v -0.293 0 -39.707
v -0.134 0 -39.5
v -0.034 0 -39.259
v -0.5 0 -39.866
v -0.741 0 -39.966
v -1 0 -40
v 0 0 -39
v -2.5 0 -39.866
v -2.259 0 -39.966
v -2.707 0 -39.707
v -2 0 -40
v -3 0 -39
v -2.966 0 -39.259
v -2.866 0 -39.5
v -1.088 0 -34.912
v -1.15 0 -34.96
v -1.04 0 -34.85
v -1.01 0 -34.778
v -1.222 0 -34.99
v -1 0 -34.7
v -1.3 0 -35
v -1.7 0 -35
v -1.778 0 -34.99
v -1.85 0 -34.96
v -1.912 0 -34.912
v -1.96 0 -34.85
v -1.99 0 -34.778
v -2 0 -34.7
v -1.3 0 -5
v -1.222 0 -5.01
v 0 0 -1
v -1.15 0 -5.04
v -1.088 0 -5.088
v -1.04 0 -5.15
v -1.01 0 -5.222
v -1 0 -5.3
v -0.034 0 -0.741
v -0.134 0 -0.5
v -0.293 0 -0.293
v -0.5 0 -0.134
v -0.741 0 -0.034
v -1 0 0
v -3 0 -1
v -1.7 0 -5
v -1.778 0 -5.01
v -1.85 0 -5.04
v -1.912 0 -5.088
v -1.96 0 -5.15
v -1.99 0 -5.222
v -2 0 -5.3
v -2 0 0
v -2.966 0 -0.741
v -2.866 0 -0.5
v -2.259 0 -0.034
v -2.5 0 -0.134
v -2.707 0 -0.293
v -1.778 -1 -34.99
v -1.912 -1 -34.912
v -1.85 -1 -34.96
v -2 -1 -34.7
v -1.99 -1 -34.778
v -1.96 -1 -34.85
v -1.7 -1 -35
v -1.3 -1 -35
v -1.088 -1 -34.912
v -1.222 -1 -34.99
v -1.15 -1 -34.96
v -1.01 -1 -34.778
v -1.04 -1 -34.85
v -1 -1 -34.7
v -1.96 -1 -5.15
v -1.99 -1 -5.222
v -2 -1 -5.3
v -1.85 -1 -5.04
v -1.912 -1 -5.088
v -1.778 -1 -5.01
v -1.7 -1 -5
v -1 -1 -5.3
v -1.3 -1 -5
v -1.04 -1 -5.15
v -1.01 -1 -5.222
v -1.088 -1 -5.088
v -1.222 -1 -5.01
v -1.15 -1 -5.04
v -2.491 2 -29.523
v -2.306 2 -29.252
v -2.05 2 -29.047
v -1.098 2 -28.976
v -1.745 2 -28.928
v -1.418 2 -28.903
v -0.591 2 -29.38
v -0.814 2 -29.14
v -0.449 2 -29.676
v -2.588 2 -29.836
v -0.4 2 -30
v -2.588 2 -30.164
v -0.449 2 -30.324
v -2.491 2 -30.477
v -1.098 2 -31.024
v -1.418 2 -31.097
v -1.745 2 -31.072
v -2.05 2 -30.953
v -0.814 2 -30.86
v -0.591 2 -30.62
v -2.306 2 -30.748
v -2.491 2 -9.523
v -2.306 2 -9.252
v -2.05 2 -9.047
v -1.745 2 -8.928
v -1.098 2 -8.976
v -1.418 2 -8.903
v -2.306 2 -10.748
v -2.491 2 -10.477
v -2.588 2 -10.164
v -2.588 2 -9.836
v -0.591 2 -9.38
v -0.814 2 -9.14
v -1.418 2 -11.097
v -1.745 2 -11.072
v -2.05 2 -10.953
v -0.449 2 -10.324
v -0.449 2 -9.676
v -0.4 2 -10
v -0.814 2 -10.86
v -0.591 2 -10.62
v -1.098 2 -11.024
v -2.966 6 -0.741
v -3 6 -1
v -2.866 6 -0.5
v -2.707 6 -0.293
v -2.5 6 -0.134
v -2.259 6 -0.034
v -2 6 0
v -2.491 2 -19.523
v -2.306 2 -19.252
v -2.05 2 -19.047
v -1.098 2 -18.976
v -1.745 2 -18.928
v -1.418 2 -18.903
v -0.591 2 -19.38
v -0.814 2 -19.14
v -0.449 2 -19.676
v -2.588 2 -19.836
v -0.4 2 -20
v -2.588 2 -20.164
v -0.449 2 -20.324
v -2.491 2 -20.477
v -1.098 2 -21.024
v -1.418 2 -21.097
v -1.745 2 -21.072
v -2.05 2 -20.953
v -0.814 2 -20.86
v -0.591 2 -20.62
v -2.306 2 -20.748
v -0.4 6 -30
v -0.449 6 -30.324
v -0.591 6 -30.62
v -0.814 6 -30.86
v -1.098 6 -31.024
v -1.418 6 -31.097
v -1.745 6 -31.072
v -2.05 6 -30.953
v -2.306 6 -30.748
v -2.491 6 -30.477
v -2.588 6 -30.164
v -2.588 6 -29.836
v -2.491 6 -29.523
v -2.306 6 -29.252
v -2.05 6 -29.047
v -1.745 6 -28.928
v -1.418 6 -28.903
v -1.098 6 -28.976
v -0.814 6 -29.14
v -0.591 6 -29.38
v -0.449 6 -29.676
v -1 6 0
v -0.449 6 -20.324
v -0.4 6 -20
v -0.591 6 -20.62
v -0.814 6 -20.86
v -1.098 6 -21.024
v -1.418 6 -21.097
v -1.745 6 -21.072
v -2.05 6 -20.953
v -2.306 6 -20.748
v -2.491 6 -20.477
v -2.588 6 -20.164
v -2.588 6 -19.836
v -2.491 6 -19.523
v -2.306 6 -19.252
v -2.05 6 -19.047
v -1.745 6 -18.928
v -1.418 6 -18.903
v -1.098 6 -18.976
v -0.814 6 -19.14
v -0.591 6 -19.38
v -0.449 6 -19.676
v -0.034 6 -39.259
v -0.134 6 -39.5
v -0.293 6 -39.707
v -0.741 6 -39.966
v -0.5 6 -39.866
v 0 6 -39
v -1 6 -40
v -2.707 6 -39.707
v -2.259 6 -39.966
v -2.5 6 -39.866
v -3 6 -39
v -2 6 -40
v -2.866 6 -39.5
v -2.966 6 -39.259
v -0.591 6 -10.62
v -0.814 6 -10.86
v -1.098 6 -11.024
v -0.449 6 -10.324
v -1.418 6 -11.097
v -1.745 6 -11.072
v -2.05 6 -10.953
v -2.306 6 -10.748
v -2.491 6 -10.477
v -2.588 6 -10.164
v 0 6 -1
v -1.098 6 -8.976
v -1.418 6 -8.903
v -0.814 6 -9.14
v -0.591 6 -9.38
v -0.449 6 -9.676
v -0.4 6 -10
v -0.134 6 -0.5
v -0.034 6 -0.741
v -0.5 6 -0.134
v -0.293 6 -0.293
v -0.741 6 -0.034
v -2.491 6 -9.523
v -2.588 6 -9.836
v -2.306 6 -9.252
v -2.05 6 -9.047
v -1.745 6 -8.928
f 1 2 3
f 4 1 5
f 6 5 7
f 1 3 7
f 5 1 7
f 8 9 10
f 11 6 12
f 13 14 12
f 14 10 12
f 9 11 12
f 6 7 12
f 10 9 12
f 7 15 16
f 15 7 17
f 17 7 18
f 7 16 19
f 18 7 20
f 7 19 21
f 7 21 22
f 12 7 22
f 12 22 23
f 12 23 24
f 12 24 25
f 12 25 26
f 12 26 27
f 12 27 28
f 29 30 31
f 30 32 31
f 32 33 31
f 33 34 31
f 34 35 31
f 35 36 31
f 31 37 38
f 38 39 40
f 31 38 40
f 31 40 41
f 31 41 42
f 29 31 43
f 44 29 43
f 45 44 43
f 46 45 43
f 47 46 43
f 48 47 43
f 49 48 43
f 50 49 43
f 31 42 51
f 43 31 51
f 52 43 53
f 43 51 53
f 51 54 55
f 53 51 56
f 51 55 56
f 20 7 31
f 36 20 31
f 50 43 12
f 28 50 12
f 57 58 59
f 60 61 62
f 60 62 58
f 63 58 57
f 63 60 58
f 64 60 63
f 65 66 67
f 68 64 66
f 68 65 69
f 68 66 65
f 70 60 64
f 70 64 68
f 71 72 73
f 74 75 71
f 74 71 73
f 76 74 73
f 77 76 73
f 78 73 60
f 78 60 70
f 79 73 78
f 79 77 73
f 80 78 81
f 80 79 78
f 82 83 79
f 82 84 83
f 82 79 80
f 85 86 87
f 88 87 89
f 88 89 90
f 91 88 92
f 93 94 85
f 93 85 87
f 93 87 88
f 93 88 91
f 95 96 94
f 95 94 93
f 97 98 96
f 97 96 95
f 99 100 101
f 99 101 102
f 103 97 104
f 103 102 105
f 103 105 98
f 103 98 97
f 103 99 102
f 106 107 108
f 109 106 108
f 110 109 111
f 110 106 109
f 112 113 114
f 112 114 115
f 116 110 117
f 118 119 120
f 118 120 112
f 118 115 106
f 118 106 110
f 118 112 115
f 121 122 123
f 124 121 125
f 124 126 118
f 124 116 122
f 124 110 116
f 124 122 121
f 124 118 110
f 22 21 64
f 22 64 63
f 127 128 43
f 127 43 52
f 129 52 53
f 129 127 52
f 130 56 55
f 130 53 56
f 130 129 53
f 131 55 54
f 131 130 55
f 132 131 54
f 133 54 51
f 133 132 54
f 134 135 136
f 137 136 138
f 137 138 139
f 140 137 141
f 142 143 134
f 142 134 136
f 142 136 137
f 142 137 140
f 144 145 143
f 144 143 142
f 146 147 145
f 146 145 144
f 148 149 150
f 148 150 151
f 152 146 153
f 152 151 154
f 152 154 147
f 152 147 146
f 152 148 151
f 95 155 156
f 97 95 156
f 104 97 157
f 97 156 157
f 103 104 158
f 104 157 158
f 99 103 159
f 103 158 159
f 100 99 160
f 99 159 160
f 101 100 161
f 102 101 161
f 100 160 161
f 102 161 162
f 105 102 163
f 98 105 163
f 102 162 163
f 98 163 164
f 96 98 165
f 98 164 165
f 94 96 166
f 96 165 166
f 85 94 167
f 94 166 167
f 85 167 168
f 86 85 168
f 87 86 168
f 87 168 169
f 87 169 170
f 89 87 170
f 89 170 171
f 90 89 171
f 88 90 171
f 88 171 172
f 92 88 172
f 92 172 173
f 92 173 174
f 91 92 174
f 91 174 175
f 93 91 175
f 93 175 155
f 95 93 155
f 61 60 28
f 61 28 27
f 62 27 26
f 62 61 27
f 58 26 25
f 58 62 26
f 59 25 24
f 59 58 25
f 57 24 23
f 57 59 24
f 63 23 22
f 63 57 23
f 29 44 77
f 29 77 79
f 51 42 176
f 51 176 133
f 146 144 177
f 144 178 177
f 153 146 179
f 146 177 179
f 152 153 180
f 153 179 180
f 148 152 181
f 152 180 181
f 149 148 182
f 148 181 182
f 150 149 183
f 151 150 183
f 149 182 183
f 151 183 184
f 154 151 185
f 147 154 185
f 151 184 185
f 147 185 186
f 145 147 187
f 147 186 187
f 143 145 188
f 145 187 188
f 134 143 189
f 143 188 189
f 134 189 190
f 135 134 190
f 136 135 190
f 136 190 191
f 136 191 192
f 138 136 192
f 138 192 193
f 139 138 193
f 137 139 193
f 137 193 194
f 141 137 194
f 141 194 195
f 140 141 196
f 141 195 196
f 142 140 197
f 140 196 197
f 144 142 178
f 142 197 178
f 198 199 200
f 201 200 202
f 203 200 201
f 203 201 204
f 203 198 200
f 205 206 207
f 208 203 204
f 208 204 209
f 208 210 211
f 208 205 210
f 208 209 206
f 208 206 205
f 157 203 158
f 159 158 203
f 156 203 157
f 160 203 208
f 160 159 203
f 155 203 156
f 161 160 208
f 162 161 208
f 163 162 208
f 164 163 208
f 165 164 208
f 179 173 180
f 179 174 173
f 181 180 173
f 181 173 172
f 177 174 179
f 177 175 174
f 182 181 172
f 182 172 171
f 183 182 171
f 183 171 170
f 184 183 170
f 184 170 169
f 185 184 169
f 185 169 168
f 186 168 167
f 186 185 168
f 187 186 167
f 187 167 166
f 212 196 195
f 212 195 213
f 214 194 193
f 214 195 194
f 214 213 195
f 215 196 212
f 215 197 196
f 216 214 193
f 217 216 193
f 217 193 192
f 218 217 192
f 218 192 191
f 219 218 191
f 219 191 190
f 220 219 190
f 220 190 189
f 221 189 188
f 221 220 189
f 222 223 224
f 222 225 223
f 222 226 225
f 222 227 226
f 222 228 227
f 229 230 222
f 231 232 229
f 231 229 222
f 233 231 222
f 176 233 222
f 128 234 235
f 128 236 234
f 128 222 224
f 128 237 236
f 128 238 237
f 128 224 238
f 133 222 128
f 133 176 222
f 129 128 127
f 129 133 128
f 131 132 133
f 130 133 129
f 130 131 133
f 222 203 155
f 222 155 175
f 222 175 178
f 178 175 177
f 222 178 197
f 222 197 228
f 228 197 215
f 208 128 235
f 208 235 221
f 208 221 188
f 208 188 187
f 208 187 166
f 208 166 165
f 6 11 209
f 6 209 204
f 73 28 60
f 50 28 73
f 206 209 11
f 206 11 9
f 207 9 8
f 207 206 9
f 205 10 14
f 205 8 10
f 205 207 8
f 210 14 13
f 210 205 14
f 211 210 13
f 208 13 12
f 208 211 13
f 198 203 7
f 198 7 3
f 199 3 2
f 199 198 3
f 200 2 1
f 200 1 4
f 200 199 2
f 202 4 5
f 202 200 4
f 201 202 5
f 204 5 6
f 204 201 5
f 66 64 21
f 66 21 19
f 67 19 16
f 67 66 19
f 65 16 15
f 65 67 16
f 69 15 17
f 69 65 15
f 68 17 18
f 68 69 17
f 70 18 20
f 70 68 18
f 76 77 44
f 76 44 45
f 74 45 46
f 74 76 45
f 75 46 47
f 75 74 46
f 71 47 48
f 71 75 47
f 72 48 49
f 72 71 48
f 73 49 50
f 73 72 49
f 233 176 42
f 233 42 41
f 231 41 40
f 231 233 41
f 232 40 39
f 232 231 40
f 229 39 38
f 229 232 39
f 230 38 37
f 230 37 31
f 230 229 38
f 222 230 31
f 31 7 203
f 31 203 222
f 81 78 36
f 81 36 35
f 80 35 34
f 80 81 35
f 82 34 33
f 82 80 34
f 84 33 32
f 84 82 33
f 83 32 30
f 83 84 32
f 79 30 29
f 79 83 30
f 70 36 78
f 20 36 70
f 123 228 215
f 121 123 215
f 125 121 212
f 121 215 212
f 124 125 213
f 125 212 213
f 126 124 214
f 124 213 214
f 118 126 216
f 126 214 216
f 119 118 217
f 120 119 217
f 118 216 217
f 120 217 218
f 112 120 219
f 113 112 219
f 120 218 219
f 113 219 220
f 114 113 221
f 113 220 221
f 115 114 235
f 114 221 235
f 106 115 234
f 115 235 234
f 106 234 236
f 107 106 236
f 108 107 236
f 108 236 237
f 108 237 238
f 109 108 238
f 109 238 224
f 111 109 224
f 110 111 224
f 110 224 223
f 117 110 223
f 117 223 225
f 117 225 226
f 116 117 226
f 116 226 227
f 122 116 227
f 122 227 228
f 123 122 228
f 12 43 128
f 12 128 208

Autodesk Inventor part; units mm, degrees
ref_plane "YZ Plane" through (0, 0, 0) normal (1, 0, 0) x (0, 1, 0)
ref_plane "XZ Plane" through (0, 0, 0) normal (0, 1, 0) x (-1, 0, 0)
ref_plane "XY Plane" through (0, 0, 0) normal (0, 0, 1) x (1, 0, 0)
sketch "Эскиз1" plane through (0, 0, 0) normal (0, 1, 0) x (-1, 0, 0)
  line L0 (0, 0) -> (3, 0)
  line L1 (3, 0) -> (3, -40)
  line L2 (3, -40) -> (0, -40)
  line L3 (0, -40) -> (0, 0)
  line L4 (0, 0) -> (1, 0)
  line L5 (0, -5) -> (0, 0)
  line L6 (3, -40) -> (2, -40)
  line L7 (3, -35) -> (3, -40)
  dimension "d0" = 40
  dimension "d1" = 3
extrude "Выдавливание1" add sketch "Эскиз1" along normal blind 6
sketch "Эскиз2" plane through (0, 0, 0) normal (0, -1, 0) x (1, 0, 0)
  line L0 (-3, 0) -> (0, 0) projected
  line L1 (-3, 0) -> (-2, 0)
  line L2 (-2, -5) -> (-1, -5)
  line L3 (-1, -5) -> (-1, -35)
  line L4 (-1, -35) -> (-2, -35)
  line L5 (-2, -35) -> (-2, -5)
  point P0 (0, -40)
  dimension "d13" = 30
  dimension "d14" = 1
extrude "Выдавливание2" add sketch "Эскиз2" along normal blind 1
fillet "Сопряжение1" radius 1 4 edges at (0, 3, 0) (-3, 3, 0) (0, 3, -40) (-3, 3, -40)
fillet "Сопряжение2" radius 0.3 4 edges at (-1, -0.5, -35) (-2, -0.5, -35) (-1, -0.5, -5) (-2, -0.5, -5)
sketch "Эскиз3" plane through (0, 6, 0) normal (0, 1, 0) x (1, 0, 0)
  line L0 (0, 0) -> (-1.5, 0)
  line L1 (0, 1) -> (0, 39) projected
  line L2 (0, 20) -> (0, 30)
  circle A0 centre (-1.5, 10) radius 1.1
  circle A1 centre (-1.5, 20) radius 1.1
  circle A2 centre (-1.5, 30) radius 1.1
  dimension "d23" = 2.2
  dimension "d24" = 2.2
  dimension "d25" = 2.2
extrude "Выдавливание3" cut sketch "Эскиз3" against normal blind 4
properties part number "Bush" material "Медь"
